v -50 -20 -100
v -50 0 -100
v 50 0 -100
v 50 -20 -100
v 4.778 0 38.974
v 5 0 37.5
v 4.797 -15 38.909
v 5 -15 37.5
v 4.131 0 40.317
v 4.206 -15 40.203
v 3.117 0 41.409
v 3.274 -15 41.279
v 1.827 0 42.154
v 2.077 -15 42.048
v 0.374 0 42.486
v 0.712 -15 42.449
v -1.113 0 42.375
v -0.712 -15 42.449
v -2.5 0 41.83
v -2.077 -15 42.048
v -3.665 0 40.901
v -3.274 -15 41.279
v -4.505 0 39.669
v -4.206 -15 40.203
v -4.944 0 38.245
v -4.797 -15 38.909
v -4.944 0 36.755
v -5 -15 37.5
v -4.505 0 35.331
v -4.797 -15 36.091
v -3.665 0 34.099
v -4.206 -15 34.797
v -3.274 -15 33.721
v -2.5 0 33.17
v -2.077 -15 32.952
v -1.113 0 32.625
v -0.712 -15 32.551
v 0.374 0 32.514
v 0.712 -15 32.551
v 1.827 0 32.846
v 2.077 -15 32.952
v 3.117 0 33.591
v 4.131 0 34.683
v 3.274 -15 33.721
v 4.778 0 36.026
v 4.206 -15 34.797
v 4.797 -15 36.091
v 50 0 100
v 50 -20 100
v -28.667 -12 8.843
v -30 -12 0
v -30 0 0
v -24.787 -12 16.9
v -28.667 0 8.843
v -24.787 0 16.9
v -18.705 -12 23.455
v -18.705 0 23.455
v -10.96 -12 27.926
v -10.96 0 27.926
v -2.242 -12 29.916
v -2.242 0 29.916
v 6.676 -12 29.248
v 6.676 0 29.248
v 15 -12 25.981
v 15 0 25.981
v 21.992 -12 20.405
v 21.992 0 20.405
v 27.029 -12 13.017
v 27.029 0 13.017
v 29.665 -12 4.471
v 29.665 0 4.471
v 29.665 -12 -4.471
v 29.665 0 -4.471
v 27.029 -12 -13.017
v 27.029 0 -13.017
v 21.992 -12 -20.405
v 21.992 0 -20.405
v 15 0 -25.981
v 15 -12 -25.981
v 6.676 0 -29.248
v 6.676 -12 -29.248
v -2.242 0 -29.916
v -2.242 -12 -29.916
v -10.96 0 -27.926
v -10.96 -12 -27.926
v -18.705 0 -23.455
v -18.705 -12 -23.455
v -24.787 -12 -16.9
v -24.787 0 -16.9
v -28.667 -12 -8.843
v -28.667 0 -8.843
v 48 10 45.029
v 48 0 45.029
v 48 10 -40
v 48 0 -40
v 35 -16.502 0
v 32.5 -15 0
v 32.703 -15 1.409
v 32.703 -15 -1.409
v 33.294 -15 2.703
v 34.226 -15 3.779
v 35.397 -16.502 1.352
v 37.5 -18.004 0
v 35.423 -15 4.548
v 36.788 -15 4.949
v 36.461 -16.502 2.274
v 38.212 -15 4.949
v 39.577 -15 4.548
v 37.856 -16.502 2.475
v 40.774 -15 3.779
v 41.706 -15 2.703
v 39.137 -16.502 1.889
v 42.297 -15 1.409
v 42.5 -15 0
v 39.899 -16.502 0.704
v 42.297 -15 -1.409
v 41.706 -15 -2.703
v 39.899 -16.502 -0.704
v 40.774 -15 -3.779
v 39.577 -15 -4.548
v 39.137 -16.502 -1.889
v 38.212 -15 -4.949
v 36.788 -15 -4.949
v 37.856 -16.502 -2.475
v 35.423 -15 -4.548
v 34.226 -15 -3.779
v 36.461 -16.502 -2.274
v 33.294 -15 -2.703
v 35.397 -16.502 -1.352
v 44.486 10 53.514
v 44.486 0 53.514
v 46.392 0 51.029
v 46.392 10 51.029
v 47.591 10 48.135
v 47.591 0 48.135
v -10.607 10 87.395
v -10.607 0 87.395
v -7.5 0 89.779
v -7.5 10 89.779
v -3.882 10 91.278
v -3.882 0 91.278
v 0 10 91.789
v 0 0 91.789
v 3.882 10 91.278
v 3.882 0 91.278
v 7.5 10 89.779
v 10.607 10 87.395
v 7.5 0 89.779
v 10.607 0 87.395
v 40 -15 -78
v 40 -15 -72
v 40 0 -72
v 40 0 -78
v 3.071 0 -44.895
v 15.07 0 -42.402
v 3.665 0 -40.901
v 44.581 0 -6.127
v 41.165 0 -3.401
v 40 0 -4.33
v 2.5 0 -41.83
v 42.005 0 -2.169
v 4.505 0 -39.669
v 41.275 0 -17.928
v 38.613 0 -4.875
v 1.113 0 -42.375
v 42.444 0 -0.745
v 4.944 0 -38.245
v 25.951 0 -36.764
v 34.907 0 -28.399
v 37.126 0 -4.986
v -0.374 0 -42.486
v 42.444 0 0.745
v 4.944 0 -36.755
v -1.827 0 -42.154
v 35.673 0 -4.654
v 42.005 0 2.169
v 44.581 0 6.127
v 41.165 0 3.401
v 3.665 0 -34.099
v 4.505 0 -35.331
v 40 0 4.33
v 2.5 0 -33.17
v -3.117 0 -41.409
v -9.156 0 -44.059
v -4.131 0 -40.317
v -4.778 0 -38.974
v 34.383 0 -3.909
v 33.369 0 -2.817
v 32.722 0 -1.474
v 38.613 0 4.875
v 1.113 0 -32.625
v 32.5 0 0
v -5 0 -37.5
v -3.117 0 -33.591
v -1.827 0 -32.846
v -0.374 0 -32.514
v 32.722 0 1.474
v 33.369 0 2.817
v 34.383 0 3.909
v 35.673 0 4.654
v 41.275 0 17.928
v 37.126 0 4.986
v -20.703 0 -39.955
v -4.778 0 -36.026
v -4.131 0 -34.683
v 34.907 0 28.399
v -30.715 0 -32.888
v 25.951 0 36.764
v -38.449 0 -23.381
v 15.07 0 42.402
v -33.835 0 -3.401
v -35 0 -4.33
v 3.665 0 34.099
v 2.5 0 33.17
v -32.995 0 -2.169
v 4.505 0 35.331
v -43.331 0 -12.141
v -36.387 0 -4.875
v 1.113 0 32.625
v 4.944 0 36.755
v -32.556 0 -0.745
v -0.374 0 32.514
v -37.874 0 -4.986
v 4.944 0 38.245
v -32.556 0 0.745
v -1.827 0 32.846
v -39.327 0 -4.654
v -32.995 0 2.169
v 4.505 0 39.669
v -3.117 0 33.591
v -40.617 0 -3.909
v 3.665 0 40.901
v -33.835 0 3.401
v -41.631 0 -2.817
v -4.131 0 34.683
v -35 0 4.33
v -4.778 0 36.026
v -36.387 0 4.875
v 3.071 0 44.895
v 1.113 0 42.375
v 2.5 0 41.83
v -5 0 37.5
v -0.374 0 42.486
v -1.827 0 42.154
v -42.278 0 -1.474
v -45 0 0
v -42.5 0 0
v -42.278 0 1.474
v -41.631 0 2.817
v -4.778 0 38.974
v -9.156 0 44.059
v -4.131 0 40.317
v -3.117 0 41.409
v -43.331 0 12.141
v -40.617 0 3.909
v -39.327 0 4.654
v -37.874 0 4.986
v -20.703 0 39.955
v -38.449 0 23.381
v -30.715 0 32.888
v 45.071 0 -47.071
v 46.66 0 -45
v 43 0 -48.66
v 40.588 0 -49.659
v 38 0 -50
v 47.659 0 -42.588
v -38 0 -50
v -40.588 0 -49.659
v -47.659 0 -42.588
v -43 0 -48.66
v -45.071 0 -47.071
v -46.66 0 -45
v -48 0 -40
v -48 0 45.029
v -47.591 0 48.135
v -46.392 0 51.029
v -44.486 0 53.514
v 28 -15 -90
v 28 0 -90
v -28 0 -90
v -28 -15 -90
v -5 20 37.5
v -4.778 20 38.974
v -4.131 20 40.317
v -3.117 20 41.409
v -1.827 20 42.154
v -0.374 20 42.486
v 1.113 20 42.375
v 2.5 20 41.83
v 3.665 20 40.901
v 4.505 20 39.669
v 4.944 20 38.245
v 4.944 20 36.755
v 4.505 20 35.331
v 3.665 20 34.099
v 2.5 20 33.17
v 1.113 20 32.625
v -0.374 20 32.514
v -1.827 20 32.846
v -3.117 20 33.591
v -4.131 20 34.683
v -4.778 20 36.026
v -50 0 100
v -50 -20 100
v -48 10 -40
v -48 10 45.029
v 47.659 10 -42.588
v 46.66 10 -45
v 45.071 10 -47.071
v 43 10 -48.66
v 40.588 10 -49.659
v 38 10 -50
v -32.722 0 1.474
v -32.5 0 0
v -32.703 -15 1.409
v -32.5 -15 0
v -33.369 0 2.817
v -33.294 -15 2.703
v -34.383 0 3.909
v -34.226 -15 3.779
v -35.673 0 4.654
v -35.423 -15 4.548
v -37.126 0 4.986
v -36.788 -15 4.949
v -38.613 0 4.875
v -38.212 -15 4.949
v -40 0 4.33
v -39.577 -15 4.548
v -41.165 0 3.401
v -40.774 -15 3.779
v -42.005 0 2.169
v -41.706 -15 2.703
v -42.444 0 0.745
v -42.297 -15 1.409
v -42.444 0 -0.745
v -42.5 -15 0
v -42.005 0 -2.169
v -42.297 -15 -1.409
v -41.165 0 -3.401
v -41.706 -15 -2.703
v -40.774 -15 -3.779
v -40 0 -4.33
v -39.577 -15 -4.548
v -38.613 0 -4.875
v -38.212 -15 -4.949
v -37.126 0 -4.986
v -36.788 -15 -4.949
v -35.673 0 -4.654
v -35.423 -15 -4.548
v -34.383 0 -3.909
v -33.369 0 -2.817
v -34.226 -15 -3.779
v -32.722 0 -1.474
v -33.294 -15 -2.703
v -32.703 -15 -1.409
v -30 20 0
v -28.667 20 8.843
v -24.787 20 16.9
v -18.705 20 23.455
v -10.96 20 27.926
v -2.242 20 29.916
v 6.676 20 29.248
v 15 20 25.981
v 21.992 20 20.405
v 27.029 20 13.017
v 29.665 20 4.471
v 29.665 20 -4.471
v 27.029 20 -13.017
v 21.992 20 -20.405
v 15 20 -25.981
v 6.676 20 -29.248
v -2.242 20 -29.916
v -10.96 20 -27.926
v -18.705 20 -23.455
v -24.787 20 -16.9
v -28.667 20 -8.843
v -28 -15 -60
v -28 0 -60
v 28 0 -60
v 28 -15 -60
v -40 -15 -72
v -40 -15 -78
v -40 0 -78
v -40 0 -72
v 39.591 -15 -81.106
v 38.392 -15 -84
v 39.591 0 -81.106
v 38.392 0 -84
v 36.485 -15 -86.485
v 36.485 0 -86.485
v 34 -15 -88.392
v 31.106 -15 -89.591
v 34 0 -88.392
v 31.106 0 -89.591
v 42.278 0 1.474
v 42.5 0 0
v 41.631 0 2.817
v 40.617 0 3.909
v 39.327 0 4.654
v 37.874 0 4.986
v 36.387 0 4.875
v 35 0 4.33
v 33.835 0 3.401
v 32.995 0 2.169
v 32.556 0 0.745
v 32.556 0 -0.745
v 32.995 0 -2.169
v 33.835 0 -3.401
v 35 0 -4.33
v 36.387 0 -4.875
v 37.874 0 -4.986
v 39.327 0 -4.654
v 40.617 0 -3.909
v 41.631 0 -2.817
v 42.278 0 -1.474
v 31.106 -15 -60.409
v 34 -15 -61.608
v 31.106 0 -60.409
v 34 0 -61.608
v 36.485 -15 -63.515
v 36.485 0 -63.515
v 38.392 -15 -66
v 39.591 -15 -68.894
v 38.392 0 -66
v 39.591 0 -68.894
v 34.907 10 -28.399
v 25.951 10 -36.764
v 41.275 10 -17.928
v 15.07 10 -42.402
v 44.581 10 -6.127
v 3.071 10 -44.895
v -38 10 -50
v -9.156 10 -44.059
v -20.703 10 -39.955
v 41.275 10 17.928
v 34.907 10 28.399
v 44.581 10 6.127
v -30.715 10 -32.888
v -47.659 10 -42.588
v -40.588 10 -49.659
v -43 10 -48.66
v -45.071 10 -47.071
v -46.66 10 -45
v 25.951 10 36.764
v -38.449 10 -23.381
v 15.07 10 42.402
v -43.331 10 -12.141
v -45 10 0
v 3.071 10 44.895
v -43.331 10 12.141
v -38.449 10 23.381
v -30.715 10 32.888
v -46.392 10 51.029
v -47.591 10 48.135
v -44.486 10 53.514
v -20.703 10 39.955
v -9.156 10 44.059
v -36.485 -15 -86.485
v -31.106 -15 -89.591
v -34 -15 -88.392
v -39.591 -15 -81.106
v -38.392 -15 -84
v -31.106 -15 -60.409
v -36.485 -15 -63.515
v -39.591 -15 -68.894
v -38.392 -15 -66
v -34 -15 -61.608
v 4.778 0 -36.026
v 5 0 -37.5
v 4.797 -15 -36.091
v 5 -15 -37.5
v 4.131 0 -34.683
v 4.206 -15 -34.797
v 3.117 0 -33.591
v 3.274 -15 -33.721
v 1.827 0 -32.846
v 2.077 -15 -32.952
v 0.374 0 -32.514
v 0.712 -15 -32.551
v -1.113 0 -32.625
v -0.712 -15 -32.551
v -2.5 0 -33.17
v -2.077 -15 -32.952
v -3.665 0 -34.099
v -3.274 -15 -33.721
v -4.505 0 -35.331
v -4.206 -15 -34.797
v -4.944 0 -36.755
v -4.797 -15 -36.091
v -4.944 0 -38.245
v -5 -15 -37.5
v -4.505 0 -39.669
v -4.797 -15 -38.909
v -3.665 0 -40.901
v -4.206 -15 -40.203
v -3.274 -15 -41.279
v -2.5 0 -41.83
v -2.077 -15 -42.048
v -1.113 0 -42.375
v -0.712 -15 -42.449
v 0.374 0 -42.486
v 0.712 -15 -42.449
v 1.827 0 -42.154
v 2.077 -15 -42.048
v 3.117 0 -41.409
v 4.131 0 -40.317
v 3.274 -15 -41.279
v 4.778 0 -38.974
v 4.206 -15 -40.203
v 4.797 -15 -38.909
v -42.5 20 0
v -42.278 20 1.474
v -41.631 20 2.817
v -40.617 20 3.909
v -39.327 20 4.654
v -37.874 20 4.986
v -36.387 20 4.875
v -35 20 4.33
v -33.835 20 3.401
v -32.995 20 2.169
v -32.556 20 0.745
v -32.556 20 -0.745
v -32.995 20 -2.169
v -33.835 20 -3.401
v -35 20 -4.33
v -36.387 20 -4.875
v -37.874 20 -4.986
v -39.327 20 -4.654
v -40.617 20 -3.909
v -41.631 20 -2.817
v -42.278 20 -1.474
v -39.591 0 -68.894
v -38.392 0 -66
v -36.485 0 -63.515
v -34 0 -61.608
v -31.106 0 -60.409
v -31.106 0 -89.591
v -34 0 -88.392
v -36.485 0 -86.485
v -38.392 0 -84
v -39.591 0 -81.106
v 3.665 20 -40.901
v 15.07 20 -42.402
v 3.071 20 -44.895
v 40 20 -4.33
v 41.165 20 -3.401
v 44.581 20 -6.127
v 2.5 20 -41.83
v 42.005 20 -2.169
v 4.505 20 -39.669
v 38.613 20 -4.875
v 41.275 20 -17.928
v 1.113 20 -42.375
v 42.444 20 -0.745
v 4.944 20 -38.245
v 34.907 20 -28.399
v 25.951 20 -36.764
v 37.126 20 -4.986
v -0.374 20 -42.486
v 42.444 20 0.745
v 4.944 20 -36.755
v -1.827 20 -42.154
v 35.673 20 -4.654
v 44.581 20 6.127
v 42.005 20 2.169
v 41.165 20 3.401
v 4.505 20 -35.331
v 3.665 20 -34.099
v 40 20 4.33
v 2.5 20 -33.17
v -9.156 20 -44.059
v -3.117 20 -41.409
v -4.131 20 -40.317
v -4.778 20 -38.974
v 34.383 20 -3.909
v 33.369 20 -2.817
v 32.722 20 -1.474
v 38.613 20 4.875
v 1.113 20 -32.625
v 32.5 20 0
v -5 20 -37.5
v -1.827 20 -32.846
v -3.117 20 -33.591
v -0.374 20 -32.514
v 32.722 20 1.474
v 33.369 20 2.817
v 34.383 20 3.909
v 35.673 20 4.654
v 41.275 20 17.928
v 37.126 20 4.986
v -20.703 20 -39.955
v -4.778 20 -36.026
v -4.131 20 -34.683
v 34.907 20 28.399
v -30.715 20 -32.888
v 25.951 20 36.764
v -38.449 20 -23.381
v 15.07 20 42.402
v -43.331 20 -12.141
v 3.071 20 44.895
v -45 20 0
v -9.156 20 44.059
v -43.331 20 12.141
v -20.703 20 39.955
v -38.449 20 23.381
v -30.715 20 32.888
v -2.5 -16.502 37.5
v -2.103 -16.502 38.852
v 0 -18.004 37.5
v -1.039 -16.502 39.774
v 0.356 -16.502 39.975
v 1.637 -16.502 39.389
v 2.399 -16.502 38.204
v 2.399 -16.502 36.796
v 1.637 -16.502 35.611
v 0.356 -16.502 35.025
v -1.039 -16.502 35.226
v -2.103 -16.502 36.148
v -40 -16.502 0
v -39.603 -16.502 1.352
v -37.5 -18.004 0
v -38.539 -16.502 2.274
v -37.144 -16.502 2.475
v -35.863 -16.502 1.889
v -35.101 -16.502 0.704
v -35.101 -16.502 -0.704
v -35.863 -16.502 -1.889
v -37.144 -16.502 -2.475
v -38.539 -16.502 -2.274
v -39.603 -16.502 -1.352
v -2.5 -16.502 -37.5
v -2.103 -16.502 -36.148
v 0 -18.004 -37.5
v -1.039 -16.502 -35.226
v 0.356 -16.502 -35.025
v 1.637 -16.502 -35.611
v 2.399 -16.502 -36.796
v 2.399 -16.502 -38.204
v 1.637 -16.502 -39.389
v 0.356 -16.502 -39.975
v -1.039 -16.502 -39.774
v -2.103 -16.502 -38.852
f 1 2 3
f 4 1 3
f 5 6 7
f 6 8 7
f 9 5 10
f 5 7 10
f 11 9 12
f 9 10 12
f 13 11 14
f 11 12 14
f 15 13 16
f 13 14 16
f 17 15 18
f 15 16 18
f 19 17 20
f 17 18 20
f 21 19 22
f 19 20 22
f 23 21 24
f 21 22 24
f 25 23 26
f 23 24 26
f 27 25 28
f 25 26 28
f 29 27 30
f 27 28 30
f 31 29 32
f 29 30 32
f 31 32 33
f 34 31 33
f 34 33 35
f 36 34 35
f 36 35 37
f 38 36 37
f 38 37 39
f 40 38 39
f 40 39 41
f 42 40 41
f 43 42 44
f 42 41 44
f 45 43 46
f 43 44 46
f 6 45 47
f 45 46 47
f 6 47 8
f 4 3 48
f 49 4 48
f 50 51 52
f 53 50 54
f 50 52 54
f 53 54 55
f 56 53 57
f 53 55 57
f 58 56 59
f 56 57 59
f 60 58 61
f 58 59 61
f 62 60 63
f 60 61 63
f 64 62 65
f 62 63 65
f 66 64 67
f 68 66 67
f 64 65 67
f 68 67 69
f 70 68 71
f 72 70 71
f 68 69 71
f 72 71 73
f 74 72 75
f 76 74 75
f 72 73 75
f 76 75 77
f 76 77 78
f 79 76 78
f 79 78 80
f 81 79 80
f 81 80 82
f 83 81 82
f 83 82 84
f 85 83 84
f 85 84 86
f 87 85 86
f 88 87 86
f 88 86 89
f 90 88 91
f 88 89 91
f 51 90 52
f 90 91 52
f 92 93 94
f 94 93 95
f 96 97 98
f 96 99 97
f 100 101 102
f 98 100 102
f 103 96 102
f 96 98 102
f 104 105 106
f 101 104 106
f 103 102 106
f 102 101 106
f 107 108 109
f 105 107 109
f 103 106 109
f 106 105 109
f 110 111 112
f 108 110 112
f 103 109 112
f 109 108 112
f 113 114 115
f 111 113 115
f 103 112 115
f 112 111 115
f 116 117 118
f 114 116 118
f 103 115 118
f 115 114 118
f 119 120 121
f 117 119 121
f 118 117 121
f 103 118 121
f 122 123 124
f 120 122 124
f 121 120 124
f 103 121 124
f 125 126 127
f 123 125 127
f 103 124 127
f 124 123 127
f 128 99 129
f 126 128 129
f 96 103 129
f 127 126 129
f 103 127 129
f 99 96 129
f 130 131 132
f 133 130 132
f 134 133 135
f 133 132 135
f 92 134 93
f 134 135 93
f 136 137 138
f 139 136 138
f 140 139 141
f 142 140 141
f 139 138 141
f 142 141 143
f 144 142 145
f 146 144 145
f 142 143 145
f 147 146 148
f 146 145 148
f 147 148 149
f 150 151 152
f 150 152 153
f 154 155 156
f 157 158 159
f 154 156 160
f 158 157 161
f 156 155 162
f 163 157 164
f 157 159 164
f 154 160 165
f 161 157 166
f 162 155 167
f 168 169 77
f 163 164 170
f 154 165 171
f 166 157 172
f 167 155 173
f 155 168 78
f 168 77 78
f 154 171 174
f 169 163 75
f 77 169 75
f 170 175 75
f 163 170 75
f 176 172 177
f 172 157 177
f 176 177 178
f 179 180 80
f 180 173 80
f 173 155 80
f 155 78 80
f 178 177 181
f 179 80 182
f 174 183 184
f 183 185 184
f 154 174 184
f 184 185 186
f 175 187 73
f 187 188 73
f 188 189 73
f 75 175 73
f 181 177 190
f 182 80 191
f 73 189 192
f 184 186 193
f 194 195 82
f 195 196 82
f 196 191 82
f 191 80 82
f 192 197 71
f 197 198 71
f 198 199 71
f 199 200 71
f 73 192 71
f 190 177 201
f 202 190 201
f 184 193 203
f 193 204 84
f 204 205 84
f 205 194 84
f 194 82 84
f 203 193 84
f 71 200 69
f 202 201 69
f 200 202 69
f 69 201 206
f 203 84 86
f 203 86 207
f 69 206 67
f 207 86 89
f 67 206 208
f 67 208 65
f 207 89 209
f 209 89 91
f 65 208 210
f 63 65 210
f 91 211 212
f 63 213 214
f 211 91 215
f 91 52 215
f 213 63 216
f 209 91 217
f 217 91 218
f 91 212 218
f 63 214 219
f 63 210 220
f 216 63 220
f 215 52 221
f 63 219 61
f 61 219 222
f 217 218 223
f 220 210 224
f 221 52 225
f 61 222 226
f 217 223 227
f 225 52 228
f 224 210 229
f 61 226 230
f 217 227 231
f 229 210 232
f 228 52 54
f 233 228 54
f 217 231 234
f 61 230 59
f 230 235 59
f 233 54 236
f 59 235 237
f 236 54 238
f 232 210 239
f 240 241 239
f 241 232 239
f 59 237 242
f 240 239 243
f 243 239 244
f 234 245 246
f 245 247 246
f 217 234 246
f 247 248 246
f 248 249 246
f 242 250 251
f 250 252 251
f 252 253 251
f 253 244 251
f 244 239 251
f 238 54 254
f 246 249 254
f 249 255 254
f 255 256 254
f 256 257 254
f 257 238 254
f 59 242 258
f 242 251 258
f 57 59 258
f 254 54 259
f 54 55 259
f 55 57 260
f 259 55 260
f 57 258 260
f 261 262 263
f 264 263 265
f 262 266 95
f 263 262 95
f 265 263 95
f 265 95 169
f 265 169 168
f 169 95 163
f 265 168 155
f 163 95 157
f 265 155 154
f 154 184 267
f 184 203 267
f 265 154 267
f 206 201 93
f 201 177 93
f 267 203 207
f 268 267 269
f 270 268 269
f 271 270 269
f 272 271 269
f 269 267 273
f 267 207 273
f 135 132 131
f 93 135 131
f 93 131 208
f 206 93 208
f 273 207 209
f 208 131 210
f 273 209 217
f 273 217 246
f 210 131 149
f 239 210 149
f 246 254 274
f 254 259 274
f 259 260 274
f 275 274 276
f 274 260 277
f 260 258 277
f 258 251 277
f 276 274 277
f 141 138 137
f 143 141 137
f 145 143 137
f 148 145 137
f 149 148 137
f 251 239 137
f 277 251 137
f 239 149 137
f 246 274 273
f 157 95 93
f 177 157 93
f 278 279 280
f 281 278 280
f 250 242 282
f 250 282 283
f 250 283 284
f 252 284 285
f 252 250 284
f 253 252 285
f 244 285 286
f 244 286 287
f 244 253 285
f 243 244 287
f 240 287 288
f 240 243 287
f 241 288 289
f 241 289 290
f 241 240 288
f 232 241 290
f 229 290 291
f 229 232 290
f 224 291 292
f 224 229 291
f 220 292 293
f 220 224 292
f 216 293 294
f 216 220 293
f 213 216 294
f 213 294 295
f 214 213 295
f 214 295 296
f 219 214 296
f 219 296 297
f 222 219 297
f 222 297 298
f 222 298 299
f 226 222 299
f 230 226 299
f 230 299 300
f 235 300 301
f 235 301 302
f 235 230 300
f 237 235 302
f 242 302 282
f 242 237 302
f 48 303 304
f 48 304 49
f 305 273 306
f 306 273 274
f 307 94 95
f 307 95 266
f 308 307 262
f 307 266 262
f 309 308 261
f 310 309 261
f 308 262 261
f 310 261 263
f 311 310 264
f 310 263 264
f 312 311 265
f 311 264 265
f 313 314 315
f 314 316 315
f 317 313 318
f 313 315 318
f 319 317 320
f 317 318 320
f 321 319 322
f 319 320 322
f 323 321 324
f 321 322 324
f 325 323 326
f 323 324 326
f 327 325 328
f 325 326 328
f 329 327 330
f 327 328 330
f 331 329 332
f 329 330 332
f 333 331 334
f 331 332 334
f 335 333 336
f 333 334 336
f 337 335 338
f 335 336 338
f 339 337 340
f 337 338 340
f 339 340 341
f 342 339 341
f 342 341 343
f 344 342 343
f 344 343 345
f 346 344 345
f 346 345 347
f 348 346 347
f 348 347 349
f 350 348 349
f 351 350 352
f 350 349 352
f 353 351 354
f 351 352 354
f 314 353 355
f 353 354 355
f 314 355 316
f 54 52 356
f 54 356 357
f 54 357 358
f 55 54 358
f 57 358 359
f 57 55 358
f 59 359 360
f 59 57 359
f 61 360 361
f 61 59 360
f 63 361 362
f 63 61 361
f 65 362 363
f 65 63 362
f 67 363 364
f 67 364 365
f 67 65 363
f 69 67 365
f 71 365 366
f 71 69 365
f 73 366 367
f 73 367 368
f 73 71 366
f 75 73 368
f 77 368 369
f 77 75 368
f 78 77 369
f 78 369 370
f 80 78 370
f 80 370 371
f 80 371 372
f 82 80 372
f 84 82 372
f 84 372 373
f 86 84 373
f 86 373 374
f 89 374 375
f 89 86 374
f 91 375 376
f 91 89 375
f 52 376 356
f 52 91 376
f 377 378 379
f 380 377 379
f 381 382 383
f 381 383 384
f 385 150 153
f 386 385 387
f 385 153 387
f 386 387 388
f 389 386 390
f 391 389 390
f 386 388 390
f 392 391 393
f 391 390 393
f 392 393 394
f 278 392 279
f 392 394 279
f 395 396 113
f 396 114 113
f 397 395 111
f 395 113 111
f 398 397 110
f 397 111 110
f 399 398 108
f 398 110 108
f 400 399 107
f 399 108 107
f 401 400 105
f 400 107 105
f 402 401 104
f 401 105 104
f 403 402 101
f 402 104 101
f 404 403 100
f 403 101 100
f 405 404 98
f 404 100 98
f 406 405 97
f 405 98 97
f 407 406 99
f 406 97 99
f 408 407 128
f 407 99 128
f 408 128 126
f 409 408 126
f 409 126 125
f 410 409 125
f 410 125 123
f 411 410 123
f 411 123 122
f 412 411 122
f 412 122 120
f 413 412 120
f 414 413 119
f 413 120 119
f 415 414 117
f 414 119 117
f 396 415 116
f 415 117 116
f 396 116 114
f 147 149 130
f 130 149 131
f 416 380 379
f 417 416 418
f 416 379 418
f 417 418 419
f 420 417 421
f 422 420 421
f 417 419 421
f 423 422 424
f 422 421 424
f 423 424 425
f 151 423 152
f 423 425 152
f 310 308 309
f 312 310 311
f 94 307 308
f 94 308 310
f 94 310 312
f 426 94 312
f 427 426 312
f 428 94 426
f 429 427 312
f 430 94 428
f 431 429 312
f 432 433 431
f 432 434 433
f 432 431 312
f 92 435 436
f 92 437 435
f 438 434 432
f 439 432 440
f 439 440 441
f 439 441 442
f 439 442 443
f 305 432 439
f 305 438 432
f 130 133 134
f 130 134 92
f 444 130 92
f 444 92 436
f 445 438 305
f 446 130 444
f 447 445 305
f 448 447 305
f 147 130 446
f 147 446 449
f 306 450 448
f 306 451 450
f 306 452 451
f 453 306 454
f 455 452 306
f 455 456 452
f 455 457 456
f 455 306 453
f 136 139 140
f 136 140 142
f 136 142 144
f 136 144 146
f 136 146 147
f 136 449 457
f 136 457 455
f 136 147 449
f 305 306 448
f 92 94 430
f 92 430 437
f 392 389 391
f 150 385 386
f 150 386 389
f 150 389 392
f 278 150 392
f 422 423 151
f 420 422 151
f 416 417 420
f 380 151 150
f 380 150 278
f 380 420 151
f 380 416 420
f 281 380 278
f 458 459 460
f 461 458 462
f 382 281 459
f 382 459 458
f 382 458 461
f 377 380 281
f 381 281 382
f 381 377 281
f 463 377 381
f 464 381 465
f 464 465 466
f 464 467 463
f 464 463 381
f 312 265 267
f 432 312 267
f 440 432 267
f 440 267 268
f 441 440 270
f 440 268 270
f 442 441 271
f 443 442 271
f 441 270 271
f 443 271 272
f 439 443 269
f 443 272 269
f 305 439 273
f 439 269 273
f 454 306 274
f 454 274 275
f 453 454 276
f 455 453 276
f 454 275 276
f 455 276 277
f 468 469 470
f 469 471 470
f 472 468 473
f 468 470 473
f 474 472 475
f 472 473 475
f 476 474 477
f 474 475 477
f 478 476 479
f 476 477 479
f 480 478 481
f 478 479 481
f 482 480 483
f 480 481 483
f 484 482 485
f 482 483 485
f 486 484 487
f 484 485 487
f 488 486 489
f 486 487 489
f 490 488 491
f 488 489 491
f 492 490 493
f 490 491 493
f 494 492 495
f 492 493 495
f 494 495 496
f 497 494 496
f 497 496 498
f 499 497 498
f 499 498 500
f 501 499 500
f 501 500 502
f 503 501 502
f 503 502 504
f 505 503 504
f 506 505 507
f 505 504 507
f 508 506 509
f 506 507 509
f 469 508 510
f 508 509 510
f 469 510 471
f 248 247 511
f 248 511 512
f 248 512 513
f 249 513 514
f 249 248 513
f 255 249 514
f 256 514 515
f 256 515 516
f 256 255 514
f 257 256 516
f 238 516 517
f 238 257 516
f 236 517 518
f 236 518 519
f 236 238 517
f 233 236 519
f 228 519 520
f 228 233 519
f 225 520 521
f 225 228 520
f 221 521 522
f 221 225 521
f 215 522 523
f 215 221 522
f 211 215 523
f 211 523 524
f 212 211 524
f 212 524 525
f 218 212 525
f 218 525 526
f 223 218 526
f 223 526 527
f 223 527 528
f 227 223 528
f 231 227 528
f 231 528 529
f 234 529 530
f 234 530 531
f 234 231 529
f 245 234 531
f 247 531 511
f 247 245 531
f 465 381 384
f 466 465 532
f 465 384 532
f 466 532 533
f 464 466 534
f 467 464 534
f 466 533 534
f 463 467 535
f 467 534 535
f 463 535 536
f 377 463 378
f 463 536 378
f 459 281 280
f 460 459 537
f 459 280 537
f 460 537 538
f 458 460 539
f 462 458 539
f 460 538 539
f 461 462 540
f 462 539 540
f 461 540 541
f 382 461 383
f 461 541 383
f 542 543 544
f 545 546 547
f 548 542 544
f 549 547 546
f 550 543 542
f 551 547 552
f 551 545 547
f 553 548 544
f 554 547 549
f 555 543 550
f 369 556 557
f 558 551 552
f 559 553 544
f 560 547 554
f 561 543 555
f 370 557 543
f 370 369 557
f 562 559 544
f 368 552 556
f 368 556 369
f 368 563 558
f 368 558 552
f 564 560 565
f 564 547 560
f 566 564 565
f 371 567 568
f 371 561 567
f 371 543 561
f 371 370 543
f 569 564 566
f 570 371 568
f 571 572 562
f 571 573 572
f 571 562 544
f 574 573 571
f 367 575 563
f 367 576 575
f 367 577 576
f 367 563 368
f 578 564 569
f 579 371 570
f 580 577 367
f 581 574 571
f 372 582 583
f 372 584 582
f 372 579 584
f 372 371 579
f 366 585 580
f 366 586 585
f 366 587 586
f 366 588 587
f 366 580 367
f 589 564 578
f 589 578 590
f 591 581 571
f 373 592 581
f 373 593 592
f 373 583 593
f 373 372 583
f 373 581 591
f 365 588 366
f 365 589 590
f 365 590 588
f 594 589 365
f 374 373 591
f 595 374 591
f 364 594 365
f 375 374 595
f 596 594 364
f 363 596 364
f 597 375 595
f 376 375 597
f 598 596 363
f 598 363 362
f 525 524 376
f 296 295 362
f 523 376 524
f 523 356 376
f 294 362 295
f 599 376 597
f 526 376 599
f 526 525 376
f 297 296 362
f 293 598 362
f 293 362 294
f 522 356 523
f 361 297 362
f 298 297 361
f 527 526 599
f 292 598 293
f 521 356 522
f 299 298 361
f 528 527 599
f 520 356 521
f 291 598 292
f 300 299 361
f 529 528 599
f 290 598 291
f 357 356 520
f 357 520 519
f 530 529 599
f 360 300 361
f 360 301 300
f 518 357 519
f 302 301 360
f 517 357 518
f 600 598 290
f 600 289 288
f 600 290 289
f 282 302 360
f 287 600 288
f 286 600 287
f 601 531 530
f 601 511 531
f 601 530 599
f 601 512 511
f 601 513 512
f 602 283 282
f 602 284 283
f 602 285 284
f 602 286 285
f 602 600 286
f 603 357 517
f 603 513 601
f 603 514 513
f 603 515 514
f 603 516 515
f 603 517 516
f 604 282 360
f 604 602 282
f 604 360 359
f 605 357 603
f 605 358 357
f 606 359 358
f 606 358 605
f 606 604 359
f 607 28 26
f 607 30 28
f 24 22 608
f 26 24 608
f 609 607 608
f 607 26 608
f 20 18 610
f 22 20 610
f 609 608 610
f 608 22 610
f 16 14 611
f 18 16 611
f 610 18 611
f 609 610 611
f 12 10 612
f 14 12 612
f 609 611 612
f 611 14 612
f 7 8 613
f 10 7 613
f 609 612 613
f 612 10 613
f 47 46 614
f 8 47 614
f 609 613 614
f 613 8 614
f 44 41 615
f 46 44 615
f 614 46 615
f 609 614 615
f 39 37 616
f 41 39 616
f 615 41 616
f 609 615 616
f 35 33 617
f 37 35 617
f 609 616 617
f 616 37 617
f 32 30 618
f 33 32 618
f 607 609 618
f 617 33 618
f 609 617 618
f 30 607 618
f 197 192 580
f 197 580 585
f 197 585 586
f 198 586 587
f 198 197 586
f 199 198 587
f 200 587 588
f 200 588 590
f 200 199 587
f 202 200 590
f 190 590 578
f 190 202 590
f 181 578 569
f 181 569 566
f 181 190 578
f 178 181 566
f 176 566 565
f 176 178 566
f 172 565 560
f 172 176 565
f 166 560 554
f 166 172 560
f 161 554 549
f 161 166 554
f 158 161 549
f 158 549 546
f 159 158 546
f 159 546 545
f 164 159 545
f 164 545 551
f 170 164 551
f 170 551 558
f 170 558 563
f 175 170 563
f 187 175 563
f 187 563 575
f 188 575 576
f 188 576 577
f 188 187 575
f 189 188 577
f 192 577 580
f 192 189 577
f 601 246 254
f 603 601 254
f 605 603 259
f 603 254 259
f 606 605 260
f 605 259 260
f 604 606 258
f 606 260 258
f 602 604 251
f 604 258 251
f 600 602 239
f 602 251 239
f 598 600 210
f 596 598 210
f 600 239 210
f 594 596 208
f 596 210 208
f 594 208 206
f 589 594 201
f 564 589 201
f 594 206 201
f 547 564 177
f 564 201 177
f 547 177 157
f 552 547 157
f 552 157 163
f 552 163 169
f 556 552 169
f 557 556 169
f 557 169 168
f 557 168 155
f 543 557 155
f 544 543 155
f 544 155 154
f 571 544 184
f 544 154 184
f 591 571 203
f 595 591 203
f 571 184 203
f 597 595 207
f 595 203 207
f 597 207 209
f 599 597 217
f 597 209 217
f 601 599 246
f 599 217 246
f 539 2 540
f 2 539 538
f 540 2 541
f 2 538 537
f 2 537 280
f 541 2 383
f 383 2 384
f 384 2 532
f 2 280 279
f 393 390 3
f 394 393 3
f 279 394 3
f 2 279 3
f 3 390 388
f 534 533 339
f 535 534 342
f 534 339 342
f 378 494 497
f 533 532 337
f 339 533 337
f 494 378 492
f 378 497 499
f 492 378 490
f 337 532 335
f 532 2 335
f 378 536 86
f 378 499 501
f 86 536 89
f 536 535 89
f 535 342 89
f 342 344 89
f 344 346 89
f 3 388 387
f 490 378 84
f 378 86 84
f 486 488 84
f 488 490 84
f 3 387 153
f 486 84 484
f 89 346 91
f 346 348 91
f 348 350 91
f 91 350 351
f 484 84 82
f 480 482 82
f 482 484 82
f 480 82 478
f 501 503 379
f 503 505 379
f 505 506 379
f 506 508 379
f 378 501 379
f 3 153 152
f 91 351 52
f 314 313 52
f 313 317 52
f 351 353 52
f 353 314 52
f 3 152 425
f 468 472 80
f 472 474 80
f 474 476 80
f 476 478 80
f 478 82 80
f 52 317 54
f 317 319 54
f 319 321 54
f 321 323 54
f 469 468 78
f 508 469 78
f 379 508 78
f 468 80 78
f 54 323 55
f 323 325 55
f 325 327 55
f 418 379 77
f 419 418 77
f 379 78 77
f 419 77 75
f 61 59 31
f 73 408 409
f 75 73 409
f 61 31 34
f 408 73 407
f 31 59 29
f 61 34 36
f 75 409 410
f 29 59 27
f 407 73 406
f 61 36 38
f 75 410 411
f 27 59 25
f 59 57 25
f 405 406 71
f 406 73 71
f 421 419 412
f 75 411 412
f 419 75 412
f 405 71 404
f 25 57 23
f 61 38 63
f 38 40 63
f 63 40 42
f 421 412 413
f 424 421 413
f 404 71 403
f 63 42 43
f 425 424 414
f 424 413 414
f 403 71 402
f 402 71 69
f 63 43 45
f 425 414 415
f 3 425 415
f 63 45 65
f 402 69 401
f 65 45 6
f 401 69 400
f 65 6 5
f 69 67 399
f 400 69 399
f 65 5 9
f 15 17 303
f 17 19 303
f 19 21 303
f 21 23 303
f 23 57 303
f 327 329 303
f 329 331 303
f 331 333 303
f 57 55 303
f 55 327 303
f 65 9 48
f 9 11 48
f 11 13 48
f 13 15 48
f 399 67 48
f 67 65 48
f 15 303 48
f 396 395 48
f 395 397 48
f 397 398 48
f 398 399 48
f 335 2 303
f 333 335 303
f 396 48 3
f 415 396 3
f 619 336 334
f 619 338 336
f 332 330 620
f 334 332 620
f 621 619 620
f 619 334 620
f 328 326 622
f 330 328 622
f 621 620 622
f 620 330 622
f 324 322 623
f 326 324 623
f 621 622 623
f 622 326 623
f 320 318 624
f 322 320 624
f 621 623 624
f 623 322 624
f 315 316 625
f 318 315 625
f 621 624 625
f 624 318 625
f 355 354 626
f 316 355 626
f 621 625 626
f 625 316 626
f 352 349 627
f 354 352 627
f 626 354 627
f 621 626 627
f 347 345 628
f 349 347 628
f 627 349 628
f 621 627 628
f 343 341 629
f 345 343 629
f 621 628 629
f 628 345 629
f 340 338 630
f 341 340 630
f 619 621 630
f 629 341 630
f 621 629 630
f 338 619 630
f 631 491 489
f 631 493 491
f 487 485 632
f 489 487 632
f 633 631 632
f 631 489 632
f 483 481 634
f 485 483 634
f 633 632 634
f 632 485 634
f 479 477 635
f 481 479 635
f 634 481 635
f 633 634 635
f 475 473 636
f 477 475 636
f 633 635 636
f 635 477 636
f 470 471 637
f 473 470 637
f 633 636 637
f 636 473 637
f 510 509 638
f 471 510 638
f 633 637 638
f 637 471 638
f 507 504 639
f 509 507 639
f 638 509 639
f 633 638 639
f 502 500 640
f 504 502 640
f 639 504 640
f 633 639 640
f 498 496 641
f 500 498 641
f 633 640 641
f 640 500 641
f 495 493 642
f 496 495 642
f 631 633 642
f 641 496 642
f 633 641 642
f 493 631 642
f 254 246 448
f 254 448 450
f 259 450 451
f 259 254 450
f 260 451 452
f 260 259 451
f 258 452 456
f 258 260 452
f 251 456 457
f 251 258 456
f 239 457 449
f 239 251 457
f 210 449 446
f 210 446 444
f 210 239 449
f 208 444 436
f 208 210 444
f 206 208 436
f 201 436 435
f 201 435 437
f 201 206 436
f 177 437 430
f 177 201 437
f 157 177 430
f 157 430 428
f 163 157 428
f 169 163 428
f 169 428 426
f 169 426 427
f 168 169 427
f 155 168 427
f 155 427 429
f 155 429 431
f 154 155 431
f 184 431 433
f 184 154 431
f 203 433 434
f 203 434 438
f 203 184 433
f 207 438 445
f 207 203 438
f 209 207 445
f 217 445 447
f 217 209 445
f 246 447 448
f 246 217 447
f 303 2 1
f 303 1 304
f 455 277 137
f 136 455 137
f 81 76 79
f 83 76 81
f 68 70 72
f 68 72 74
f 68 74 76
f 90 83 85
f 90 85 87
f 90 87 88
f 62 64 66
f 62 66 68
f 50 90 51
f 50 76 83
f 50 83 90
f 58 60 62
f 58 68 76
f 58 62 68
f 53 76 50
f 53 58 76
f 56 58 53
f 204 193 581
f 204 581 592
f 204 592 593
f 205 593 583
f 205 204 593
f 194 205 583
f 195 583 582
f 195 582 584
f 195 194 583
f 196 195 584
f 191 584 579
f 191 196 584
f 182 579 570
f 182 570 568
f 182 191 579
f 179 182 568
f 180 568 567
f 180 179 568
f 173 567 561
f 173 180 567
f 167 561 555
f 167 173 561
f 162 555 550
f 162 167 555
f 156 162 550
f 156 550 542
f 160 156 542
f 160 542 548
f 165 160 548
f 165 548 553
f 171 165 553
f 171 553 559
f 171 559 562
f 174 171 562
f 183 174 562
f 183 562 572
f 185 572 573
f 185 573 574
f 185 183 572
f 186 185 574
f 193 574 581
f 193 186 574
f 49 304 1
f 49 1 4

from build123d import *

# Parameters (mm, degrees)
F0_W     = 100
F0_H     = 200
F1_DEPTH = 20
F3_DEPTH = 15
F2_R     = 45
F4_DEPTH = 10
F2_R_2   = 5
F2_R_3   = 30
F5_DEPTH = 20
F6_D     = 10
F6_DEPTH = 15
F6_TIP   = 3.0043030951
F7_DEPTH = 12


with BuildPart() as f1:
    # F0 (on Front) → F1 (new body)
    with BuildSketch(Plane.XZ):
        Rectangle(F0_W, F0_H)
    extrude(amount=F1_DEPTH)

    # F2 (on face) → F3 (cut)
    with BuildSketch(Plane(origin=(0, 0, 0), x_dir=(-1, 0, 0), z_dir=(0, 1, 0))):
        with BuildLine():
            ThreePointArc((-40, -78), (-36.4852813742, -86.4852813742), (-28, -90))
            Line((-28, -90), (28, -90))
            ThreePointArc((28, -90), (36.4852813742, -86.4852813742), (40, -78))
            Line((40, -78), (40, -72))
            ThreePointArc((40, -72), (36.4852813742, -63.5147186258), (28, -60))
            Line((28, -60), (-28, -60))
            ThreePointArc((-28, -60), (-36.4852813742, -63.5147186258), (-40, -72))
            Line((-40, -72), (-40, -78))
        make_face()
    extrude(amount=-F3_DEPTH, mode=Mode.SUBTRACT)

    # F6
    with Locations(Plane(origin=(0, 0, 0), x_dir=(-1, 0, 0), z_dir=(0, 1, 0))):
        with Locations((-37.5, 0), (0, -37.5), (37.5, 0), (0, 37.5)):
            Hole(F6_D / 2, depth=F6_DEPTH)
            with Locations((0, 0, -(F6_DEPTH + F6_TIP / 2))):  # 118° drill point
                Cone(0, F6_D / 2, F6_TIP, mode=Mode.SUBTRACT)

    # F2 (on face) → F7 (cut)
    with BuildSketch(Plane(origin=(0, 0, 0), x_dir=(-1, 0, 0), z_dir=(0, 1, 0))):
        Circle(F2_R_3)
    extrude(amount=-F7_DEPTH, mode=Mode.SUBTRACT)


with BuildPart() as f4:
    # F2 (on face) → F4 (new body)
    with BuildSketch(Plane(origin=(0, 0, 0), x_dir=(-1, 0, 0), z_dir=(0, 1, 0))):
        with BuildLine():
            ThreePointArc((-48, -40), (-45.0710678119, -47.0710678119), (-38, -50))
            Line((-38, -50), (38, -50))
            ThreePointArc((38, -50), (45.0710678119, -47.0710678119), (48, -40))
            Line((48, -40), (48, 45.029))
            ThreePointArc((48, 45.029), (47.0866406093, 49.6209930314), (44.4856, 53.5139627365))
            Line((44.4856, 53.5139627365), (10.607, 87.3951071902))
            ThreePointArc((10.607, 87.3951071902), (0, 91.7889037696), (-10.607, 87.3951071902))
            Line((-10.607, 87.3951071902), (-44.4856, 53.5139627365))
            ThreePointArc((-44.4856, 53.5139627365), (-47.0866406093, 49.6209930314), (-48, 45.029))
            Line((-48, 45.029), (-48, -40))
        make_face()
        Circle(F2_R, mode=Mode.SUBTRACT)
    extrude(amount=F4_DEPTH)


with BuildPart() as f5:
    # F2 (on face) → F5 (new body)
    with BuildSketch(Plane(origin=(0, 0, 0), x_dir=(-1, 0, 0), z_dir=(0, 1, 0))):
        Circle(F2_R)
        with Locations((0, -37.5)):
            Circle(F2_R_2, mode=Mode.SUBTRACT)
        with Locations((-37.5, 0)):
            Circle(F2_R_2, mode=Mode.SUBTRACT)
        Circle(F2_R_3, mode=Mode.SUBTRACT)
        with Locations((0, 37.5)):
            Circle(F2_R_2, mode=Mode.SUBTRACT)
        with Locations((37.5, 0)):
            Circle(F2_R_2, mode=Mode.SUBTRACT)
    extrude(amount=F5_DEPTH)


solid = Compound([f1.part, f4.part, f5.part])
